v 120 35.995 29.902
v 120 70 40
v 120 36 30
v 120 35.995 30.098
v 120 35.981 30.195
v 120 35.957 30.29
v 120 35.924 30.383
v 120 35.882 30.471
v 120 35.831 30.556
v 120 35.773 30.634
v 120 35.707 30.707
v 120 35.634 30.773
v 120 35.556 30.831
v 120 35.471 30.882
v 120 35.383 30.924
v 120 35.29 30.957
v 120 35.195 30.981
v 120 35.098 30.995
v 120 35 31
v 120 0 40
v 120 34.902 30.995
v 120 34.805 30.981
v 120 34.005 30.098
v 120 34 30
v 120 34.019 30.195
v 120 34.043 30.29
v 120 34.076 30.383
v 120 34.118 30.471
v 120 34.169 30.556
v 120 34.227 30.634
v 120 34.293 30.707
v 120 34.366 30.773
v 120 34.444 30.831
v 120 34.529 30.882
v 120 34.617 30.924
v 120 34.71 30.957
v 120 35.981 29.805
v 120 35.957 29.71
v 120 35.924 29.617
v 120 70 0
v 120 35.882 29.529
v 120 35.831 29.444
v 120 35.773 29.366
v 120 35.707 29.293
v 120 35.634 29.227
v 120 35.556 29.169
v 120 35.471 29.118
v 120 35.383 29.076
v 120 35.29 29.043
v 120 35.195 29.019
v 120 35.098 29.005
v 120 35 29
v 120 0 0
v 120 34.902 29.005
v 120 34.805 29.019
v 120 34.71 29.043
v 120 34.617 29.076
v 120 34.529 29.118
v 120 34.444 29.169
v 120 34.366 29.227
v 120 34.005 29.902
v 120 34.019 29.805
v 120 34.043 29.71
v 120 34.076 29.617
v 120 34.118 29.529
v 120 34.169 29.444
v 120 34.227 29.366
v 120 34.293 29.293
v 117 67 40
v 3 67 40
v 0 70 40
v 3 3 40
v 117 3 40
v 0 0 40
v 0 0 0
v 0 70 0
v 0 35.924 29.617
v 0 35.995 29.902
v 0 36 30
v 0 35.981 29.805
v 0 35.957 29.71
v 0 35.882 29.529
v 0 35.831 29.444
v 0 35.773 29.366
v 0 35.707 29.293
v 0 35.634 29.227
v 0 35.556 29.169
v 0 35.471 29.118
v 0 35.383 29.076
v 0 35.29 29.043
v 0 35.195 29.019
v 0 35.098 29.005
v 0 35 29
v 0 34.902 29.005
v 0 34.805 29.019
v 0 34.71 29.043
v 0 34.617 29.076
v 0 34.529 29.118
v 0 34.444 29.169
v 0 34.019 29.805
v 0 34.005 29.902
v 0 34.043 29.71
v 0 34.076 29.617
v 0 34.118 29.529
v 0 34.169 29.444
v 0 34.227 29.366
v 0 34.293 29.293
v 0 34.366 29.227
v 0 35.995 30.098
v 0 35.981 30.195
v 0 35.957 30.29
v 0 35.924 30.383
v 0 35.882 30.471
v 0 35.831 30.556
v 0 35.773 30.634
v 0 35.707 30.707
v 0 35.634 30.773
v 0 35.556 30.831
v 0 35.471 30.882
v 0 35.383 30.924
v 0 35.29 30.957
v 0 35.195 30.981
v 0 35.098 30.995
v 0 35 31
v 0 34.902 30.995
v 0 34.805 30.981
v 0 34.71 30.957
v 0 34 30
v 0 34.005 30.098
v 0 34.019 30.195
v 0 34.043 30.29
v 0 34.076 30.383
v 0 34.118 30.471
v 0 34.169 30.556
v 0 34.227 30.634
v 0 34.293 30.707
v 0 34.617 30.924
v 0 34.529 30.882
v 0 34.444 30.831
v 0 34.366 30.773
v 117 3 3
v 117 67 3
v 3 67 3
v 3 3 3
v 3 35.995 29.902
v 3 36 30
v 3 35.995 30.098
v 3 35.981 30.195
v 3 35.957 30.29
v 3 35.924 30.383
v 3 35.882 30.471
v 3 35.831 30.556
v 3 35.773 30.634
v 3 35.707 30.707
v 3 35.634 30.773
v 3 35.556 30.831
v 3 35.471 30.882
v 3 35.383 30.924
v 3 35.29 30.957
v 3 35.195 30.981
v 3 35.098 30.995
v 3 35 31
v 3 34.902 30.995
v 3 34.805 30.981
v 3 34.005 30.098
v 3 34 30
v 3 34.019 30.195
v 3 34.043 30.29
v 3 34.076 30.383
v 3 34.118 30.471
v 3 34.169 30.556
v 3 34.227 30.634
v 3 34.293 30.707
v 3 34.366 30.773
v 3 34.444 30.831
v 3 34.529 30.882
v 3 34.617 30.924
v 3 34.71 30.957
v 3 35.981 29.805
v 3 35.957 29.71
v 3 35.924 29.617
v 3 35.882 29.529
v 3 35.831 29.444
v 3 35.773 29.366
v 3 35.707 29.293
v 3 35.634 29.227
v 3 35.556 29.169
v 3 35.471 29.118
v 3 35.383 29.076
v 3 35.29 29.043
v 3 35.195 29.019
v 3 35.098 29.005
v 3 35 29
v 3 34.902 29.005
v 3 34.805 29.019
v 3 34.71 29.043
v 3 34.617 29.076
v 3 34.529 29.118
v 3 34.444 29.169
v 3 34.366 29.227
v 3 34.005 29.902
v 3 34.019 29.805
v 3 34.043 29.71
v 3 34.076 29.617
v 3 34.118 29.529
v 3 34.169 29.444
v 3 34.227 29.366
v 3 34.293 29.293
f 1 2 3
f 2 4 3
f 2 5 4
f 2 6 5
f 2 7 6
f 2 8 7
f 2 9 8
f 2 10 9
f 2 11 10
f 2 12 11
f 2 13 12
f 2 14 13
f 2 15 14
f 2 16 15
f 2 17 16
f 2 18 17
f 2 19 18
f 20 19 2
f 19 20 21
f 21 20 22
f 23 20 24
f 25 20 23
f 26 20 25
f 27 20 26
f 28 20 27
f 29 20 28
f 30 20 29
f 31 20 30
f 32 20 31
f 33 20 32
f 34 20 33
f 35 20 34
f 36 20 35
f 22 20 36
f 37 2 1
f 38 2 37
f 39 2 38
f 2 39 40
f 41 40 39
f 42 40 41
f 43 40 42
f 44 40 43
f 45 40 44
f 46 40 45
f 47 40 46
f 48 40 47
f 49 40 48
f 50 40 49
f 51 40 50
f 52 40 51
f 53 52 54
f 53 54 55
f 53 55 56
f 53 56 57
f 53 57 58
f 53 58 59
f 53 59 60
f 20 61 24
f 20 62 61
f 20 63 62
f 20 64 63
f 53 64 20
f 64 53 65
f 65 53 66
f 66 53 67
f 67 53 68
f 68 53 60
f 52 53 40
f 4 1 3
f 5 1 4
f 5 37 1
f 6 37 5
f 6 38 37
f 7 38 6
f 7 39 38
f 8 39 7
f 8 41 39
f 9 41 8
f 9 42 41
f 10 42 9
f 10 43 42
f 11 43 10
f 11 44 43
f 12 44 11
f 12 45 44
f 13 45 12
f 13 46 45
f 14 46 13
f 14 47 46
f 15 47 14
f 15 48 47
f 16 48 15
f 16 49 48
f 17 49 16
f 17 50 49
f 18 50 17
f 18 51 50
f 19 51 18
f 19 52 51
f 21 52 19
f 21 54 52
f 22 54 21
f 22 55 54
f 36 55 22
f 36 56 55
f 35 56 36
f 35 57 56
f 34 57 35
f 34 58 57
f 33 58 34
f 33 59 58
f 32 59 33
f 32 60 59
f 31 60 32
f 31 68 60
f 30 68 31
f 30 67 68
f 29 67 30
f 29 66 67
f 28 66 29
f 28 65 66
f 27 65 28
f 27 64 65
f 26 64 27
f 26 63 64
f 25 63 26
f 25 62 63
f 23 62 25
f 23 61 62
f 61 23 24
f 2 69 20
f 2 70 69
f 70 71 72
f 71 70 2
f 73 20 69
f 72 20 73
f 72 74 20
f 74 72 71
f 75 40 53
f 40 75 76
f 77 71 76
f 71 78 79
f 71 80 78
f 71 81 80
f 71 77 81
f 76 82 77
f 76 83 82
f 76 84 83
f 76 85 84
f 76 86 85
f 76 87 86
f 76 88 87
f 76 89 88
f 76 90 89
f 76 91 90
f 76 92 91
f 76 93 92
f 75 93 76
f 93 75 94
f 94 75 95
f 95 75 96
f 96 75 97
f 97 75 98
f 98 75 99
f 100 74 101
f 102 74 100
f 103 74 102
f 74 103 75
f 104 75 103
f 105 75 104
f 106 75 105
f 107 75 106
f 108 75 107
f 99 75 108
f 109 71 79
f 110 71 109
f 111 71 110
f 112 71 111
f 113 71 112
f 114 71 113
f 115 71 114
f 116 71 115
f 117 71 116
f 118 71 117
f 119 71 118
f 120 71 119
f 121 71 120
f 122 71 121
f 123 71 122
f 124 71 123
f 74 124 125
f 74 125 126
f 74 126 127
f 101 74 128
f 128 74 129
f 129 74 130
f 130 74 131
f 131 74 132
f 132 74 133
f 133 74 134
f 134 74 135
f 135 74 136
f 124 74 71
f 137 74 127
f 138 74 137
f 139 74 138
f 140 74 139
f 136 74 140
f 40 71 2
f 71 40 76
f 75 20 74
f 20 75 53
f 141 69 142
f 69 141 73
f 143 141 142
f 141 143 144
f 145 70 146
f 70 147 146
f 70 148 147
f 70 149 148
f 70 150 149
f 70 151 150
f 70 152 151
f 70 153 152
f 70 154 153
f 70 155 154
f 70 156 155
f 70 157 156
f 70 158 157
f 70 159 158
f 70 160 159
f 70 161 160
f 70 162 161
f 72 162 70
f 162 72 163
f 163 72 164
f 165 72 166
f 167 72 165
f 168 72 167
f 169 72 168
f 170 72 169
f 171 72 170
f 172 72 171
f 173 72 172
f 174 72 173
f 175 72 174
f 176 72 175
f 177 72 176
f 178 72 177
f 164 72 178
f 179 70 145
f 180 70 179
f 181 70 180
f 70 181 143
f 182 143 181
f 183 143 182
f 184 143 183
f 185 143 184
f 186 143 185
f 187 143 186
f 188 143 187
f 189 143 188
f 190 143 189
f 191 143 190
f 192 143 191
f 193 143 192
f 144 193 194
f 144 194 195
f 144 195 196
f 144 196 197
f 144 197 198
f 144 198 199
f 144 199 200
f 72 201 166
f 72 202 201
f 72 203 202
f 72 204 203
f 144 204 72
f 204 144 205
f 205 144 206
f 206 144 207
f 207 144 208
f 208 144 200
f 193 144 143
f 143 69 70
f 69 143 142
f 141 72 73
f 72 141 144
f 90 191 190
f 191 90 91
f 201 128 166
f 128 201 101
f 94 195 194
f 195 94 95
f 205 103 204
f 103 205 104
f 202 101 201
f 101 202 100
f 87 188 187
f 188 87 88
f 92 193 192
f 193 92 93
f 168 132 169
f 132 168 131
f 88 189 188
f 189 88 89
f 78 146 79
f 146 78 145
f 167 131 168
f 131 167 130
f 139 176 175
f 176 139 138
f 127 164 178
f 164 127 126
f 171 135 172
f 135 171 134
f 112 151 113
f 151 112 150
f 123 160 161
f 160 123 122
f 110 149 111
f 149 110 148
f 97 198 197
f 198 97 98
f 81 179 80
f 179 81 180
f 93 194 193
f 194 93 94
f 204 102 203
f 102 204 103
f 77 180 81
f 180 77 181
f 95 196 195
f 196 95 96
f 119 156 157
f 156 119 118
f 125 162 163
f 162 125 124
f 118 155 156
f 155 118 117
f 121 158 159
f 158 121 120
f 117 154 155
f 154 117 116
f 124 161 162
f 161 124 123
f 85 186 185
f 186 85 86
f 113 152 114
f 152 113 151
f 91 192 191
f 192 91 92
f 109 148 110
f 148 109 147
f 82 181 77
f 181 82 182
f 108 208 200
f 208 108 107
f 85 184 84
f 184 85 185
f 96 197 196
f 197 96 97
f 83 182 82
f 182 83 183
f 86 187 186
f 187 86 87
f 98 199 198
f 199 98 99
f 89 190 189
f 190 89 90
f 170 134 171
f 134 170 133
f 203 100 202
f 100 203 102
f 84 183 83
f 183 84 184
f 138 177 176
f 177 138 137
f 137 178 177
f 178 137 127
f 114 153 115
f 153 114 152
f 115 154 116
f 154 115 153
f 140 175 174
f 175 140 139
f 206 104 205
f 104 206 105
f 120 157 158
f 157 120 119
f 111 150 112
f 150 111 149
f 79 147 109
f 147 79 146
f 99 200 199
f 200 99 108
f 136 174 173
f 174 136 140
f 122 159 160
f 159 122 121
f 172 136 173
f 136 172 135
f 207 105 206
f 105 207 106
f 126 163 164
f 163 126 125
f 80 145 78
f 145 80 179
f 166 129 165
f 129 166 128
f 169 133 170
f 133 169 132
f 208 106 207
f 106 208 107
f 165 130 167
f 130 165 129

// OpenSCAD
// Buffer tank for mini horizontal gel-electrophoresis box
// Corrected logic: Single difference to ensure platform is part of the solid mass.

// --- Dimensions ---
outer_x = 120;      // Total length (X)
outer_y = 70;       // Total width (Y)
outer_z = 40;       // Total height (Z)
wall_t  = 3;        // Wall thickness
floor_t = 3;        // Floor thickness

platform_len = 60;  // Length of the central platform (X)
platform_h_rel = 10; // Height of platform top above inner floor

hole_d = 2;         // Diameter of electrode wire holes
hole_z = 30;        // Z-coordinate for holes

$fn = 64;

// --- Calculations ---
platform_x_start = (outer_x / 2) - (platform_len / 2);
platform_z_top   = floor_t + platform_h_rel;

difference() {
    // 1. The Main Solid Body (Outer shell + Platform)
    union() {
        // The outer boundary block
        cube([outer_x, outer_y, outer_z]);
        
        // The platform: added to the solid block before any subtractions
        // It spans the full inner width (outer_y - 2*wall_t)
        translate([platform_x_start, wall_t, floor_t])
            cube([platform_len, outer_y - 2*wall_t, platform_h_rel]);
    }

    // 2. Subtract the main interior void
    // This void is the space above the floor and inside the walls
    translate([wall_t, wall_t, floor_t])
        cube([outer_x - 2*wall_t, outer_y - 2*wall_t, outer_z]);

    // 3. Subtract the electrode holes
    // Hole 1 (Left wall)
    translate([-1, outer_y/2, hole_z])
        rotate([0, 90, 0])
            cylinder(h = wall_t + 2, d = hole_d);
            
    // Hole 2 (Right wall)
    translate([outer_x, outer_y/2, hole_z])
        rotate([0, 90, 0])
            cylinder(h = wall_t + 2, d = hole_d);
}
